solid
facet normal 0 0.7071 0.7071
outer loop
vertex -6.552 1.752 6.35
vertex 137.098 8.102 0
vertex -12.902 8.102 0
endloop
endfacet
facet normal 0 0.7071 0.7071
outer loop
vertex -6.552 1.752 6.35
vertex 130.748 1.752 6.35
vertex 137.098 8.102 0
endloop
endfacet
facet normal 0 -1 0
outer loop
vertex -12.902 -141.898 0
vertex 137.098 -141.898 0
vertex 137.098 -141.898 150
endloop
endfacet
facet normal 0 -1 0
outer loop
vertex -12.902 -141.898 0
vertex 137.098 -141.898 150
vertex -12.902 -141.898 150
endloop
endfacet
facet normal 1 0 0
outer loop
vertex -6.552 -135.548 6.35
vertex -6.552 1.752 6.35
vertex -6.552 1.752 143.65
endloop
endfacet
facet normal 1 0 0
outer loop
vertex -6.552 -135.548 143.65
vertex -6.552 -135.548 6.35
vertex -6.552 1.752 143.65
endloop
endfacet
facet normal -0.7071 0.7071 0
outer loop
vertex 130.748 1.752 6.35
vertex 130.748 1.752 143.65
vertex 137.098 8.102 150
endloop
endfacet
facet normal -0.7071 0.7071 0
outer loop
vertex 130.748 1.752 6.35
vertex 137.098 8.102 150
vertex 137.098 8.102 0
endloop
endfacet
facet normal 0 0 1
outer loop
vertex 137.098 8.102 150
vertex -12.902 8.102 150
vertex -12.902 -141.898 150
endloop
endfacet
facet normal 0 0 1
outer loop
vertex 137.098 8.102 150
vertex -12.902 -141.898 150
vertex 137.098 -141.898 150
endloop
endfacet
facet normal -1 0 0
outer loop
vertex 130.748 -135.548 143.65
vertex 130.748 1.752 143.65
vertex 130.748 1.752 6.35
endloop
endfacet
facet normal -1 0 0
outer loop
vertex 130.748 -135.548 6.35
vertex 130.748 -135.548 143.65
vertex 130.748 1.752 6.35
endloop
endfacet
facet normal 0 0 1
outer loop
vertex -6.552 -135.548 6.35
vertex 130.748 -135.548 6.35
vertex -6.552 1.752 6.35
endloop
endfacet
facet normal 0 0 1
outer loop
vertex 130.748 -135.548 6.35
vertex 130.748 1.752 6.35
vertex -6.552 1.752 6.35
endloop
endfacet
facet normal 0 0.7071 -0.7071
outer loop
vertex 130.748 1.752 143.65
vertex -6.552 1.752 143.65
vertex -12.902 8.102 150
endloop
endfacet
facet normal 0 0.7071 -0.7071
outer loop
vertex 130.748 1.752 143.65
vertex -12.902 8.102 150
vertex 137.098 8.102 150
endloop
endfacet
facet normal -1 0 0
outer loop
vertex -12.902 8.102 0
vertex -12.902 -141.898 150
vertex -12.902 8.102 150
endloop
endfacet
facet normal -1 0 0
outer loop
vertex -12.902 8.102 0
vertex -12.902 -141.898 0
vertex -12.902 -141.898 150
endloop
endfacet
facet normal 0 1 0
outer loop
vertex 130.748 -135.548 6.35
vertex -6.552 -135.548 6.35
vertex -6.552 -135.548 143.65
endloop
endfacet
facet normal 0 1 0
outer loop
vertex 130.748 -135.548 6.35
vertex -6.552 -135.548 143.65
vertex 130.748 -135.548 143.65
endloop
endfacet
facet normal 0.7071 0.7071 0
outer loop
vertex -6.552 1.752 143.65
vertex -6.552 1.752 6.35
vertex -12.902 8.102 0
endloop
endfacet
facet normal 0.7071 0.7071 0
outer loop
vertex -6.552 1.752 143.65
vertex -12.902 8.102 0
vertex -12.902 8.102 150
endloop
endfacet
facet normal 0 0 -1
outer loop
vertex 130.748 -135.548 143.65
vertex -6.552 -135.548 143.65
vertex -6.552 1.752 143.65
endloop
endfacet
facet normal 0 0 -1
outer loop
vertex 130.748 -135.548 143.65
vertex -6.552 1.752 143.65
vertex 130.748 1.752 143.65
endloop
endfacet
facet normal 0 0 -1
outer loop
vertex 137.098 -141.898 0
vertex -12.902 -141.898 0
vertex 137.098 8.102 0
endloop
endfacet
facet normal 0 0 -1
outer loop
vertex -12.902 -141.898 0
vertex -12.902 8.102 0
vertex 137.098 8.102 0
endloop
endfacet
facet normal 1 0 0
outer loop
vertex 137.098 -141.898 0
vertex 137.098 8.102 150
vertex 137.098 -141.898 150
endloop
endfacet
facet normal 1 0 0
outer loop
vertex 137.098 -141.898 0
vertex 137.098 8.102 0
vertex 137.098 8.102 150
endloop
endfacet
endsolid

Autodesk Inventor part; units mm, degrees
ref_plane "YZ Plane" through (0, 0, 0) normal (1, 0, 0) x (0, 1, 0)
ref_plane "XZ Plane" through (0, 0, 0) normal (0, 1, 0) x (-1, 0, 0)
ref_plane "XY Plane" through (0, 0, 0) normal (0, 0, 1) x (1, 0, 0)
sketch "Sketch1" plane through (0, 0, 0) normal (0, 0, 1) x (1, 0, 0)
  line L0 (-12.9018, 8.1017) -> (137.0982, 8.1017)
  line L1 (137.0982, 8.1017) -> (137.0982, -141.8983)
  line L2 (137.0982, -141.8983) -> (-12.9018, -141.8983)
  line L3 (-12.9018, -141.8983) -> (-12.9018, 8.1017)
  point P0 (0, 0)
  dimension "d0" = 150
  dimension "d1" = 150
extrude "Extrusion1" add sketch "Sketch1" along normal blind 150
sketch "Sketch2" plane through (-12.9018, 8.1017, 0) normal (0, 1, 0) x (1, 0, 0)
  point P0 (12.9018, 0)
ref_plane "Work Plane1" through (-12.9018, 1.7517, 0) normal (0, 1, 0) x (1, 0, 0)
sketch "Sketch3" plane through (-12.9018, 1.7517, 0) normal (0, 1, 0) x (1, 0, 0)
  line L0 (6.35, -143.65) -> (143.65, -143.65)
  line L1 (143.65, -143.65) -> (143.65, -6.35)
  line L2 (143.65, -6.35) -> (6.35, -6.35)
  line L3 (6.35, -6.35) -> (6.35, -143.65)
  line L4 (150, -150) -> (0, -150) projected
  line L5 (0, 0) -> (0, -150) projected
  point P0 (12.9018, 0)
  dimension "d5" = 137.3
  dimension "d6" = 137.3
  dimension "d7" = 6.35
  dimension "d8" = 6.35
loft "Loft1" cut profiles "Sketch3" section 1 edges at (62.0982, 8.1017, 0) (-12.9018, 8.1017, 75) (62.0982, 8.1017, 150) (137.0982, 8.1017, 75)
sketch "Sketch4" plane through (-6.5518, 1.7517, 6.35) normal (0, 1, 0) x (1, 0, 0)
  line L0 (0, -137.3) -> (137.3, -137.3) projected
  line L1 (137.3, -137.3) -> (137.3, 0) projected
  line L2 (0, -137.3) -> (137.3, -137.3)
  line L3 (137.3, -137.3) -> (137.3, 0)
  line L4 (137.3, 0) -> (0, 0)
  line L5 (0, 0) -> (0, -137.3)
  point P0 (6.5518, 6.35)
extrude "Extrusion2" cut sketch "Sketch4" against normal blind 137.3
properties part number "insulationbox"
